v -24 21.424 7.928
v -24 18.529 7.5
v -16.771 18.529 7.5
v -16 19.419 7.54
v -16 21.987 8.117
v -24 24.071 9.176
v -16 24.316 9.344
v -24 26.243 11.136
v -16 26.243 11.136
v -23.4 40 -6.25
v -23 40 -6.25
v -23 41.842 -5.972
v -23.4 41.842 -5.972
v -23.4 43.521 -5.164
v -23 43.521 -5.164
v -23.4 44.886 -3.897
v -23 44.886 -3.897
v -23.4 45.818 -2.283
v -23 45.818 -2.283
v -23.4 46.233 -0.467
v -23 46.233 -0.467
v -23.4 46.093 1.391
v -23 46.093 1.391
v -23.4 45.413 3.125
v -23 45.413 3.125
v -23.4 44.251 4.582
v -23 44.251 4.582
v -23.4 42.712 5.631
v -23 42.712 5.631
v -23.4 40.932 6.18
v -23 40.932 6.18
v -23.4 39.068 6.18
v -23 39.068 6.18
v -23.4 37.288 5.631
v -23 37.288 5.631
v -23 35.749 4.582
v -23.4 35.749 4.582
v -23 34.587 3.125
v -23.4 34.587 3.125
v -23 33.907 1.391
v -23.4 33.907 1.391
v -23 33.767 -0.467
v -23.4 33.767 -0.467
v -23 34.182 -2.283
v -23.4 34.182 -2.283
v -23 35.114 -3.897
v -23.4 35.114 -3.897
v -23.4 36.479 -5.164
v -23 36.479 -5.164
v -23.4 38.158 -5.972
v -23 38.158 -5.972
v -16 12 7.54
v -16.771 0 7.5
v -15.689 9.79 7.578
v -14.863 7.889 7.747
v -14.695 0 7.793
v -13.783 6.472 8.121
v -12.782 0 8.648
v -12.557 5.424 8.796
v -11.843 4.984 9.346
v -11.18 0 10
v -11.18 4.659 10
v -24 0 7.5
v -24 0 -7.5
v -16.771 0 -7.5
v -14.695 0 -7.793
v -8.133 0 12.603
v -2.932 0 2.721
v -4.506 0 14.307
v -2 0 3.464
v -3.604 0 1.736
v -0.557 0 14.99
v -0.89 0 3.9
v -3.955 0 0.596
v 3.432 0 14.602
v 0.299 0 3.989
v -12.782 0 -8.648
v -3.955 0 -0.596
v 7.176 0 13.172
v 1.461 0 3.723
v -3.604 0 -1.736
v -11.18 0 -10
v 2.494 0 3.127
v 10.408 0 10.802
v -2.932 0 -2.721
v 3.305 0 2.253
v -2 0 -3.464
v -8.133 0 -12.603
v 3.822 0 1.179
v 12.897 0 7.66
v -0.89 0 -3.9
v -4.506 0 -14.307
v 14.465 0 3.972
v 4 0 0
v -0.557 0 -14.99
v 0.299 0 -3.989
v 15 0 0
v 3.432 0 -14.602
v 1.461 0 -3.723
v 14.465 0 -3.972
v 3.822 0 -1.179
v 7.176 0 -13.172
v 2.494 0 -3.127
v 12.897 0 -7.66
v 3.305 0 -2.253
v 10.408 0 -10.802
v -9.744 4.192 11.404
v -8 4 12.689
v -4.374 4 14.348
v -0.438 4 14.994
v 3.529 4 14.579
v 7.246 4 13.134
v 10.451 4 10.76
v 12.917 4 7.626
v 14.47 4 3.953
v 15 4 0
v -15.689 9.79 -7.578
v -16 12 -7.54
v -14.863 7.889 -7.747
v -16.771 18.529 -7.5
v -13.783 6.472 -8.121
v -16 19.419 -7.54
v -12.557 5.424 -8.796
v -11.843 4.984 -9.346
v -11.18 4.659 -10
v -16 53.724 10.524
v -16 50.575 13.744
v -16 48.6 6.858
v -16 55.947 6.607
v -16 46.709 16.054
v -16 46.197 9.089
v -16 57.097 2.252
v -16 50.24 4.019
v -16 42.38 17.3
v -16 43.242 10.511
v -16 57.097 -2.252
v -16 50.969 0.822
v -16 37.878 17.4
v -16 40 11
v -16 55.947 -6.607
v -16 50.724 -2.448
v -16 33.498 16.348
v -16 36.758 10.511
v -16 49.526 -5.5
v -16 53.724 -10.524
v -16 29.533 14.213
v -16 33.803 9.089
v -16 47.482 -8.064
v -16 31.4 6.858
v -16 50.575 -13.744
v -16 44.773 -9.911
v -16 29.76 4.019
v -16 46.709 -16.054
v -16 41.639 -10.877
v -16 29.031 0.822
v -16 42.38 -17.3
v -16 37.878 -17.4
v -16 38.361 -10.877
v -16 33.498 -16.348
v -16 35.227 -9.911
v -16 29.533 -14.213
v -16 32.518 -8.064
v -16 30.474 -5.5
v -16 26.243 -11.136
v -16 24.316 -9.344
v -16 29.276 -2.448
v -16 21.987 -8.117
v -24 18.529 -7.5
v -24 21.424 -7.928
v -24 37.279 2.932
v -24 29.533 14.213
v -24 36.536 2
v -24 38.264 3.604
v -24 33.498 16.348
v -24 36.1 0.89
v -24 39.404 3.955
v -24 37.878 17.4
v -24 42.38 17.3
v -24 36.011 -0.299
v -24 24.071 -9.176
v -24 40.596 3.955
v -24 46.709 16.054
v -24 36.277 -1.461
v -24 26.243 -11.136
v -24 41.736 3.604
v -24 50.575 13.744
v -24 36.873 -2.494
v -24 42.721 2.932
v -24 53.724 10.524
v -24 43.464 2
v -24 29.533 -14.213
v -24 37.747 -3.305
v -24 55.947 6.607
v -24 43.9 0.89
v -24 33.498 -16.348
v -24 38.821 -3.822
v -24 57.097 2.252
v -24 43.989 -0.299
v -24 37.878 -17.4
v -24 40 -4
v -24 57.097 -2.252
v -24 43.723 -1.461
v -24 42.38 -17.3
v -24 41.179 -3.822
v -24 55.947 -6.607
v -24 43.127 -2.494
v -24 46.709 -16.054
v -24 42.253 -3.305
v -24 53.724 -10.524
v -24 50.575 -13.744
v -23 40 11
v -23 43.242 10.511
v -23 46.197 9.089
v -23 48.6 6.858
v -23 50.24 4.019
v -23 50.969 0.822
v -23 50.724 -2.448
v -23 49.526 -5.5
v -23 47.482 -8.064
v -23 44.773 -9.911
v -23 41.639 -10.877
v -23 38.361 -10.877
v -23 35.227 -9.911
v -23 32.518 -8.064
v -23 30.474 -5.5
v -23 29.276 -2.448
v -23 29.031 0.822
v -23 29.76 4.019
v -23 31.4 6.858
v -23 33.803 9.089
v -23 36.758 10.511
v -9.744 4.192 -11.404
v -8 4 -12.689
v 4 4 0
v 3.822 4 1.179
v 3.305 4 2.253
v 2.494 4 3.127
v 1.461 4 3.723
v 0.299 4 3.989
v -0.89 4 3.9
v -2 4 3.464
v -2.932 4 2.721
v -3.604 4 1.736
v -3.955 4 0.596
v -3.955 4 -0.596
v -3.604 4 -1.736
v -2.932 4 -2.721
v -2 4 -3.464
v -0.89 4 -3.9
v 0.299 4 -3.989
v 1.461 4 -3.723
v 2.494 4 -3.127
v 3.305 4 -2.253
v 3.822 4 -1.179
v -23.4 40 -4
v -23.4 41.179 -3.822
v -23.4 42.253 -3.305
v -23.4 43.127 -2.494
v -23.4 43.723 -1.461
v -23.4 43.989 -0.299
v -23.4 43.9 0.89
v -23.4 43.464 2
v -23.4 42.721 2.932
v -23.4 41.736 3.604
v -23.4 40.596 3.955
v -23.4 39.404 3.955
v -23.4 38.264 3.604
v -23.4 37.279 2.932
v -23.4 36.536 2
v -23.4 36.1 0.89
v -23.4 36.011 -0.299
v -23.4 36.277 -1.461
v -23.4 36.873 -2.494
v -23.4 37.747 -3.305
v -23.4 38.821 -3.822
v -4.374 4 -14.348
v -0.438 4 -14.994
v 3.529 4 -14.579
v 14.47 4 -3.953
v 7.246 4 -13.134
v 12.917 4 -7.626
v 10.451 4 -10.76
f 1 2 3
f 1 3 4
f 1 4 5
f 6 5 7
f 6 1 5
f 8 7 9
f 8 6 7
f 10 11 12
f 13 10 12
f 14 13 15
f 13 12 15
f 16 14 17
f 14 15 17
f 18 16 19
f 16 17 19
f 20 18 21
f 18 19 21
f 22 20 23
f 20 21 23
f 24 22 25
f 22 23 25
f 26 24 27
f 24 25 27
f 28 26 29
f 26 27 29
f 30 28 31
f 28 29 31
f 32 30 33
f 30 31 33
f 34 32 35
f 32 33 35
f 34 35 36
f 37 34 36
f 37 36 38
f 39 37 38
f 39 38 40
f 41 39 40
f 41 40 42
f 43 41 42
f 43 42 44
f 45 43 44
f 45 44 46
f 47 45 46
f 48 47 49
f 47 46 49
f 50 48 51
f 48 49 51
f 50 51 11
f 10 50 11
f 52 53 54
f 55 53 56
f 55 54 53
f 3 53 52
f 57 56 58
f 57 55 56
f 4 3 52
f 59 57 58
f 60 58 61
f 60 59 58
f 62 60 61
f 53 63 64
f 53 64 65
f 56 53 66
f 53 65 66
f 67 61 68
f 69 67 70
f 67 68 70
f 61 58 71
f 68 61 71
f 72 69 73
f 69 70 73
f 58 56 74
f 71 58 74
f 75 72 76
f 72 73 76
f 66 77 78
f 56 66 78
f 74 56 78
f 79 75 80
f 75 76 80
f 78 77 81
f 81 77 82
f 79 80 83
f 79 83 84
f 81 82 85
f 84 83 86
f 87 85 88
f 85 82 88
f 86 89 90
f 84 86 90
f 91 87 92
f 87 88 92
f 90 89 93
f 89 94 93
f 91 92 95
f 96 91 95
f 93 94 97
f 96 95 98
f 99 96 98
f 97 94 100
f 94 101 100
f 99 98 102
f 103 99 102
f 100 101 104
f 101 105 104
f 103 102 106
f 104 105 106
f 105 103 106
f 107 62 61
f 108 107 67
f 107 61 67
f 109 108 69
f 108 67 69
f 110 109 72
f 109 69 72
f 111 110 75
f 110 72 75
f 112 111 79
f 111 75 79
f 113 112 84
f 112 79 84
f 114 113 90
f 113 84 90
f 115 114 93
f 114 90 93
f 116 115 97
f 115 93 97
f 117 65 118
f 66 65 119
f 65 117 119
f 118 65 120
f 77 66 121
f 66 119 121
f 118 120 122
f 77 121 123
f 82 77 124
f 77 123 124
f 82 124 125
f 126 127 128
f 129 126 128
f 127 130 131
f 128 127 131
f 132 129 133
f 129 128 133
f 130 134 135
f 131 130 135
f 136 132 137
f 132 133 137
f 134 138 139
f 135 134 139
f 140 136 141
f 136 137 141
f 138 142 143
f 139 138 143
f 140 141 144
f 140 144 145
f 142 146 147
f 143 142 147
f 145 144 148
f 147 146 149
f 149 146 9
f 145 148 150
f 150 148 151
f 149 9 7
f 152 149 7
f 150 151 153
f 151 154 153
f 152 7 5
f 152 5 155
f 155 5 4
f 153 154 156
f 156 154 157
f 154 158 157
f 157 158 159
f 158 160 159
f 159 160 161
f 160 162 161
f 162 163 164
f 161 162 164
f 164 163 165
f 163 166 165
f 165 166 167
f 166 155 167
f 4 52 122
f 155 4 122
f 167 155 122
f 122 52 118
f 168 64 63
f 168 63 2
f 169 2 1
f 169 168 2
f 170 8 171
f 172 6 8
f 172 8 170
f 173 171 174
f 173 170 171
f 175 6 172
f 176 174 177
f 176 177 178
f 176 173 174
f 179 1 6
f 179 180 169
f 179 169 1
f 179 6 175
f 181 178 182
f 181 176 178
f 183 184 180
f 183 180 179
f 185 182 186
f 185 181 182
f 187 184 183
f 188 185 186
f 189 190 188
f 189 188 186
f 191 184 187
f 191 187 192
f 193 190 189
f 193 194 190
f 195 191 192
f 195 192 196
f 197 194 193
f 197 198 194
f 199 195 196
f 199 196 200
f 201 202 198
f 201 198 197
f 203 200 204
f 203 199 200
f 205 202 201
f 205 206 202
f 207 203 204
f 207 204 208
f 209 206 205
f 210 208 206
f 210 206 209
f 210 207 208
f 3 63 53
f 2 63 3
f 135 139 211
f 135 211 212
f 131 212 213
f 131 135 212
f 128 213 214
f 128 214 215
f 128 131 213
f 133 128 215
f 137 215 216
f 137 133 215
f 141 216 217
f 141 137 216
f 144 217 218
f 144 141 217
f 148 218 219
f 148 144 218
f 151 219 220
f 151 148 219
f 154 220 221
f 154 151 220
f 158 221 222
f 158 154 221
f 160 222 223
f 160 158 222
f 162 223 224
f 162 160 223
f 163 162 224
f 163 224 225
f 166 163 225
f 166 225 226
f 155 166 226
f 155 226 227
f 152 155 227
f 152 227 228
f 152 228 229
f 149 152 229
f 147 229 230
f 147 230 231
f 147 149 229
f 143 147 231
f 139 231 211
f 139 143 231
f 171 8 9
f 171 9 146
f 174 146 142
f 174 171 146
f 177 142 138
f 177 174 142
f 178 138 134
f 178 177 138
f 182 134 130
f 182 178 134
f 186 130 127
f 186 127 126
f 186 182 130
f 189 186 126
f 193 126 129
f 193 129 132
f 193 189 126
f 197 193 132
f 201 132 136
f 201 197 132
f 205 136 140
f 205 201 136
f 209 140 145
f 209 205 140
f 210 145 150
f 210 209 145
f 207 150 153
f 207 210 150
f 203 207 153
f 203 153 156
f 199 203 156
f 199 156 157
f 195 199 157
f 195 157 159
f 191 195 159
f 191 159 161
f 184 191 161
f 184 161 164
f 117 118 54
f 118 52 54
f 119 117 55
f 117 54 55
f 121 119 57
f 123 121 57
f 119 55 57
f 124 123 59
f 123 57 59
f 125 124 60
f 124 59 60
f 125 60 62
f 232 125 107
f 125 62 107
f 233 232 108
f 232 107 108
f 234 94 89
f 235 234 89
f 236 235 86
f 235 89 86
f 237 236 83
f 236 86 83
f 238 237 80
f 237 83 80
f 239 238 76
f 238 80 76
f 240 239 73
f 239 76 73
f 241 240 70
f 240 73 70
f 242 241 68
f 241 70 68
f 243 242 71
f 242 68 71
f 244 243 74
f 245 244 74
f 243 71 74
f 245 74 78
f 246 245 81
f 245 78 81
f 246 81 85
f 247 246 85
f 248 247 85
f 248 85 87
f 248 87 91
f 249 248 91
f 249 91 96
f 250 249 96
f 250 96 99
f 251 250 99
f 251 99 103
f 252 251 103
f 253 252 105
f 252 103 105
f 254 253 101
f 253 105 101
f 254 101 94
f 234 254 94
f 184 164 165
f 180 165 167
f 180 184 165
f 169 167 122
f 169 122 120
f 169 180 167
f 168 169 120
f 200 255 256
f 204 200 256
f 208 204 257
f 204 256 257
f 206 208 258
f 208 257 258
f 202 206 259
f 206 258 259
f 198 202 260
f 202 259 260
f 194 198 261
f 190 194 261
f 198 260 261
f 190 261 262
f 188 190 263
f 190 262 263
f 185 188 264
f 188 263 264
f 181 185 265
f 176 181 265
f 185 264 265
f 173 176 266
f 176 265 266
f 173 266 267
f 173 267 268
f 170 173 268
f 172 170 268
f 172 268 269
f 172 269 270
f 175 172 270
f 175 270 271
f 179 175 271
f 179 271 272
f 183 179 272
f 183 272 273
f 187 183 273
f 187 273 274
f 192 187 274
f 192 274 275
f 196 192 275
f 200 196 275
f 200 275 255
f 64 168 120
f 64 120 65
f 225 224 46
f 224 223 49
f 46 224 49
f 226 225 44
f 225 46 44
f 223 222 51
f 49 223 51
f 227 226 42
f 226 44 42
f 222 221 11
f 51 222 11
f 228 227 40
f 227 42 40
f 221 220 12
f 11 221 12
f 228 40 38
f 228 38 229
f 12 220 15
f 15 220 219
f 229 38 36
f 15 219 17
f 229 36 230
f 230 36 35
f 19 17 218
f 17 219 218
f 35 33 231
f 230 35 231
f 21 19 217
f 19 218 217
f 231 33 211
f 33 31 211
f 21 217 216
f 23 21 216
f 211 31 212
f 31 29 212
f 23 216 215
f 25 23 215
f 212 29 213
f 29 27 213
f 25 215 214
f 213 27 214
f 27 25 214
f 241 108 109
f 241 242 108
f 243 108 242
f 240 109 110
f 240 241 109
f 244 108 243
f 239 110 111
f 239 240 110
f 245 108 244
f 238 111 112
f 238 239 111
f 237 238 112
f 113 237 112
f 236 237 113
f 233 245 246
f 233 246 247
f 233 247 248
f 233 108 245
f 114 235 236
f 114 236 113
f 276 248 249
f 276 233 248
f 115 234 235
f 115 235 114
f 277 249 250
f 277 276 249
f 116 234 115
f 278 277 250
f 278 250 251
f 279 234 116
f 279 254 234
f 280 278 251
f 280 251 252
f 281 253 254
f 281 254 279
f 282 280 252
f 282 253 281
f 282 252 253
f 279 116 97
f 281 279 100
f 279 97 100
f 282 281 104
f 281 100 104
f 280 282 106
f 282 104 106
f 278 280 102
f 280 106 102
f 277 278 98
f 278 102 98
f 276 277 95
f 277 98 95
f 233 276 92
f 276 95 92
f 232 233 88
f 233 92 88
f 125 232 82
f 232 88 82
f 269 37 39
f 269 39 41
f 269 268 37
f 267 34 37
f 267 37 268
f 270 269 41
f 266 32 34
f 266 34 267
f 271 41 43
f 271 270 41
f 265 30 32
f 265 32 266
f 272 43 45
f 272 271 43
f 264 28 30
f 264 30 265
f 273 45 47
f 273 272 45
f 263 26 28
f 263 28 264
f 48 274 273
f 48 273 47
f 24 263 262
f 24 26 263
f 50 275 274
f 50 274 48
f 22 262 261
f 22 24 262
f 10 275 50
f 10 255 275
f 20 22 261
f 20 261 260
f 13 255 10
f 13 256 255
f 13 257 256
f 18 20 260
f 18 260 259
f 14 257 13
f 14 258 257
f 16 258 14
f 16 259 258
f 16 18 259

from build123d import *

# Parameters (mm, degrees)
EXTRUDE_1_DEPTH     = 4
SKETCH_4_R          = 17.5
EXTRUDE_2_DEPTH     = 8
SKETCH_3_R          = 11
CUT_EXTRUDE_1_DEPTH = 7
FILLET_5_R          = 7.5
FILLET_6_R          = 10
FILLET_7_R          = 8
SKETCH_5_R          = 4
CUT_EXTRUDE_2_DEPTH = 71.900963896
SKETCH_6_R          = 6.25
CUT_EXTRUDE_3_DEPTH = 0.4


with BuildPart() as part:
    # 草圖1 → 填料-伸長1 (new body)
    with BuildSketch(Plane(origin=(0, 0, 0), x_dir=(1, 0, 0), z_dir=(0, 1, 0))):
        with BuildLine():
            Line((-24, -7.5), (-12.990381057, -7.5))
            ThreePointArc((-12.990381057, -7.5), (-14.488887394, -3.882285677), (-15, 0))
            Line((-15, 0), (-24, 0))
            Line((-24, 0), (-24, -7.5))
        make_face()
        with BuildLine():
            ThreePointArc((-15, 0), (-14.488887394, 3.882285677), (-12.990381057, 7.5))
            Line((-12.990381057, 7.5), (-24, 7.5))
            Line((-24, 7.5), (-24, 0))
            Line((-24, 0), (-15, 0))
        make_face()
        with BuildLine():
            ThreePointArc((-4, 0), (0, 4), (4, 0))
            Line((4, 0), (15, 0))
            ThreePointArc((15, 0), (3.882285677, 14.488887394), (-12.990381057, 7.5))
            ThreePointArc((-12.990381057, 7.5), (-14.488887394, 3.882285677), (-15, 0))
            Line((-15, 0), (-4, 0))
        make_face()
        with BuildLine():
            Line((15, 0), (4, 0))
            ThreePointArc((4, 0), (0, -4), (-4, 0))
            Line((-4, 0), (-15, 0))
            ThreePointArc((-15, 0), (-14.488887394, -3.882285677), (-12.990381057, -7.5))
            ThreePointArc((-12.990381057, -7.5), (3.882285677, -14.488887394), (15, 0))
        make_face()
    extrude(amount=EXTRUDE_1_DEPTH)

    # 草圖4 → 填料-伸長2 (add)
    with BuildSketch(Plane.ZY.offset(24)):
        with Locations((0, 39.742437699)):
            Circle(SKETCH_4_R)
        with BuildLine():
            ThreePointArc((7.5, 23.931049399), (0, 22.242437699), (-7.5, 23.931049399))
            Line((-7.5, 23.931049399), (-7.5, 4))
            Line((-7.5, 4), (7.5, 4))
            Line((7.5, 4), (7.5, 23.931049399))
        make_face()
    extrude(amount=-EXTRUDE_2_DEPTH)

    # 草圖3 → 除料-伸長1 (cut)
    with BuildSketch(Plane.ZY.offset(16)):
        with Locations((0, 40)):
            Circle(SKETCH_3_R)
    extrude(amount=CUT_EXTRUDE_1_DEPTH, mode=Mode.SUBTRACT)

    # 圓角5
    fillet_5_edges = [part.edges().sort_by_distance(p)[0] for p in [
        (-12.990381057, 2, -7.5),
    ]]
    fillet(fillet_5_edges, radius=FILLET_5_R)
    fillet_5_2_edges = [part.edges().sort_by_distance(p)[0] for p in [
        (-12.990381057, 2, 7.5),
    ]]
    fillet(fillet_5_2_edges, radius=FILLET_5_R)

    # 圓角6
    # the kernel refuses this fillet: 10 mm, written as the material it adds along each edge
    with BuildSketch(Plane(origin=(-24, 23.931049399, -7.5), x_dir=(0, -1, 0), z_dir=(1, 0, 0))) as fillet_6_piece_1_section:
        with BuildLine():
            CenterArc((5.401815135, 10), FILLET_6_R, 219.521196359, 50.478803641)
            ThreePointArc((-2.312077024, 3.636363636), (-1.04368494, 1.889618599), (0, 0))
            Line((0, 0), (5.401815135, 0))
        make_face()
    fillet_6_piece_1 = extrude(amount=20.734028006, mode=Mode.PRIVATE)
    fillet_6_piece_1 = split(fillet_6_piece_1, bisect_by=Plane(origin=(-16, 22.860103081, -8.083386196), z_dir=(-1, 0, 0)), keep=Keep.TOP, mode=Mode.PRIVATE)
    add(fillet_6_piece_1)
    with BuildSketch(Plane(origin=(-24, 23.931049399, 7.5), x_dir=(0, -1, 0), z_dir=(1, 0, 0))) as fillet_6_piece_2_section:
        with BuildLine():
            CenterArc((5.401815135, -10), FILLET_6_R, 90, 50.478803641)
            ThreePointArc((-2.312077024, -3.636363636), (-1.04368494, -1.889618599), (0, 0))
            Line((0, 0), (5.401815135, 0))
        make_face()
    fillet_6_piece_2 = extrude(amount=20.734028006, mode=Mode.PRIVATE)
    fillet_6_piece_2 = split(fillet_6_piece_2, bisect_by=Plane(origin=(-16, 22.860102946, 8.083386188), z_dir=(-1, 0, 0)), keep=Keep.TOP, mode=Mode.PRIVATE)
    add(fillet_6_piece_2)

    # 圓角7
    fillet_7_edges = [part.edges().sort_by_distance(p)[0] for p in [
        (-16, 4, 0),
    ]]
    fillet(fillet_7_edges, radius=FILLET_7_R)

    # 草圖5 → 除料-伸長2 (cut, through all)
    with BuildSketch(Plane(origin=(-23, 0, 0), x_dir=(0, 0, -1), z_dir=(1, 0, 0))):
        with Locations((0, 40)):
            Circle(SKETCH_5_R)
    extrude(amount=-CUT_EXTRUDE_2_DEPTH, mode=Mode.SUBTRACT)

    # 草圖6 → 除料-伸長3 (cut)
    with BuildSketch(Plane(origin=(-23, 0, 0), x_dir=(0, 0, -1), z_dir=(1, 0, 0))):
        with Locations((0, 40)):
            Circle(SKETCH_6_R)
    extrude(amount=-CUT_EXTRUDE_3_DEPTH, mode=Mode.SUBTRACT)


solid = part.part
